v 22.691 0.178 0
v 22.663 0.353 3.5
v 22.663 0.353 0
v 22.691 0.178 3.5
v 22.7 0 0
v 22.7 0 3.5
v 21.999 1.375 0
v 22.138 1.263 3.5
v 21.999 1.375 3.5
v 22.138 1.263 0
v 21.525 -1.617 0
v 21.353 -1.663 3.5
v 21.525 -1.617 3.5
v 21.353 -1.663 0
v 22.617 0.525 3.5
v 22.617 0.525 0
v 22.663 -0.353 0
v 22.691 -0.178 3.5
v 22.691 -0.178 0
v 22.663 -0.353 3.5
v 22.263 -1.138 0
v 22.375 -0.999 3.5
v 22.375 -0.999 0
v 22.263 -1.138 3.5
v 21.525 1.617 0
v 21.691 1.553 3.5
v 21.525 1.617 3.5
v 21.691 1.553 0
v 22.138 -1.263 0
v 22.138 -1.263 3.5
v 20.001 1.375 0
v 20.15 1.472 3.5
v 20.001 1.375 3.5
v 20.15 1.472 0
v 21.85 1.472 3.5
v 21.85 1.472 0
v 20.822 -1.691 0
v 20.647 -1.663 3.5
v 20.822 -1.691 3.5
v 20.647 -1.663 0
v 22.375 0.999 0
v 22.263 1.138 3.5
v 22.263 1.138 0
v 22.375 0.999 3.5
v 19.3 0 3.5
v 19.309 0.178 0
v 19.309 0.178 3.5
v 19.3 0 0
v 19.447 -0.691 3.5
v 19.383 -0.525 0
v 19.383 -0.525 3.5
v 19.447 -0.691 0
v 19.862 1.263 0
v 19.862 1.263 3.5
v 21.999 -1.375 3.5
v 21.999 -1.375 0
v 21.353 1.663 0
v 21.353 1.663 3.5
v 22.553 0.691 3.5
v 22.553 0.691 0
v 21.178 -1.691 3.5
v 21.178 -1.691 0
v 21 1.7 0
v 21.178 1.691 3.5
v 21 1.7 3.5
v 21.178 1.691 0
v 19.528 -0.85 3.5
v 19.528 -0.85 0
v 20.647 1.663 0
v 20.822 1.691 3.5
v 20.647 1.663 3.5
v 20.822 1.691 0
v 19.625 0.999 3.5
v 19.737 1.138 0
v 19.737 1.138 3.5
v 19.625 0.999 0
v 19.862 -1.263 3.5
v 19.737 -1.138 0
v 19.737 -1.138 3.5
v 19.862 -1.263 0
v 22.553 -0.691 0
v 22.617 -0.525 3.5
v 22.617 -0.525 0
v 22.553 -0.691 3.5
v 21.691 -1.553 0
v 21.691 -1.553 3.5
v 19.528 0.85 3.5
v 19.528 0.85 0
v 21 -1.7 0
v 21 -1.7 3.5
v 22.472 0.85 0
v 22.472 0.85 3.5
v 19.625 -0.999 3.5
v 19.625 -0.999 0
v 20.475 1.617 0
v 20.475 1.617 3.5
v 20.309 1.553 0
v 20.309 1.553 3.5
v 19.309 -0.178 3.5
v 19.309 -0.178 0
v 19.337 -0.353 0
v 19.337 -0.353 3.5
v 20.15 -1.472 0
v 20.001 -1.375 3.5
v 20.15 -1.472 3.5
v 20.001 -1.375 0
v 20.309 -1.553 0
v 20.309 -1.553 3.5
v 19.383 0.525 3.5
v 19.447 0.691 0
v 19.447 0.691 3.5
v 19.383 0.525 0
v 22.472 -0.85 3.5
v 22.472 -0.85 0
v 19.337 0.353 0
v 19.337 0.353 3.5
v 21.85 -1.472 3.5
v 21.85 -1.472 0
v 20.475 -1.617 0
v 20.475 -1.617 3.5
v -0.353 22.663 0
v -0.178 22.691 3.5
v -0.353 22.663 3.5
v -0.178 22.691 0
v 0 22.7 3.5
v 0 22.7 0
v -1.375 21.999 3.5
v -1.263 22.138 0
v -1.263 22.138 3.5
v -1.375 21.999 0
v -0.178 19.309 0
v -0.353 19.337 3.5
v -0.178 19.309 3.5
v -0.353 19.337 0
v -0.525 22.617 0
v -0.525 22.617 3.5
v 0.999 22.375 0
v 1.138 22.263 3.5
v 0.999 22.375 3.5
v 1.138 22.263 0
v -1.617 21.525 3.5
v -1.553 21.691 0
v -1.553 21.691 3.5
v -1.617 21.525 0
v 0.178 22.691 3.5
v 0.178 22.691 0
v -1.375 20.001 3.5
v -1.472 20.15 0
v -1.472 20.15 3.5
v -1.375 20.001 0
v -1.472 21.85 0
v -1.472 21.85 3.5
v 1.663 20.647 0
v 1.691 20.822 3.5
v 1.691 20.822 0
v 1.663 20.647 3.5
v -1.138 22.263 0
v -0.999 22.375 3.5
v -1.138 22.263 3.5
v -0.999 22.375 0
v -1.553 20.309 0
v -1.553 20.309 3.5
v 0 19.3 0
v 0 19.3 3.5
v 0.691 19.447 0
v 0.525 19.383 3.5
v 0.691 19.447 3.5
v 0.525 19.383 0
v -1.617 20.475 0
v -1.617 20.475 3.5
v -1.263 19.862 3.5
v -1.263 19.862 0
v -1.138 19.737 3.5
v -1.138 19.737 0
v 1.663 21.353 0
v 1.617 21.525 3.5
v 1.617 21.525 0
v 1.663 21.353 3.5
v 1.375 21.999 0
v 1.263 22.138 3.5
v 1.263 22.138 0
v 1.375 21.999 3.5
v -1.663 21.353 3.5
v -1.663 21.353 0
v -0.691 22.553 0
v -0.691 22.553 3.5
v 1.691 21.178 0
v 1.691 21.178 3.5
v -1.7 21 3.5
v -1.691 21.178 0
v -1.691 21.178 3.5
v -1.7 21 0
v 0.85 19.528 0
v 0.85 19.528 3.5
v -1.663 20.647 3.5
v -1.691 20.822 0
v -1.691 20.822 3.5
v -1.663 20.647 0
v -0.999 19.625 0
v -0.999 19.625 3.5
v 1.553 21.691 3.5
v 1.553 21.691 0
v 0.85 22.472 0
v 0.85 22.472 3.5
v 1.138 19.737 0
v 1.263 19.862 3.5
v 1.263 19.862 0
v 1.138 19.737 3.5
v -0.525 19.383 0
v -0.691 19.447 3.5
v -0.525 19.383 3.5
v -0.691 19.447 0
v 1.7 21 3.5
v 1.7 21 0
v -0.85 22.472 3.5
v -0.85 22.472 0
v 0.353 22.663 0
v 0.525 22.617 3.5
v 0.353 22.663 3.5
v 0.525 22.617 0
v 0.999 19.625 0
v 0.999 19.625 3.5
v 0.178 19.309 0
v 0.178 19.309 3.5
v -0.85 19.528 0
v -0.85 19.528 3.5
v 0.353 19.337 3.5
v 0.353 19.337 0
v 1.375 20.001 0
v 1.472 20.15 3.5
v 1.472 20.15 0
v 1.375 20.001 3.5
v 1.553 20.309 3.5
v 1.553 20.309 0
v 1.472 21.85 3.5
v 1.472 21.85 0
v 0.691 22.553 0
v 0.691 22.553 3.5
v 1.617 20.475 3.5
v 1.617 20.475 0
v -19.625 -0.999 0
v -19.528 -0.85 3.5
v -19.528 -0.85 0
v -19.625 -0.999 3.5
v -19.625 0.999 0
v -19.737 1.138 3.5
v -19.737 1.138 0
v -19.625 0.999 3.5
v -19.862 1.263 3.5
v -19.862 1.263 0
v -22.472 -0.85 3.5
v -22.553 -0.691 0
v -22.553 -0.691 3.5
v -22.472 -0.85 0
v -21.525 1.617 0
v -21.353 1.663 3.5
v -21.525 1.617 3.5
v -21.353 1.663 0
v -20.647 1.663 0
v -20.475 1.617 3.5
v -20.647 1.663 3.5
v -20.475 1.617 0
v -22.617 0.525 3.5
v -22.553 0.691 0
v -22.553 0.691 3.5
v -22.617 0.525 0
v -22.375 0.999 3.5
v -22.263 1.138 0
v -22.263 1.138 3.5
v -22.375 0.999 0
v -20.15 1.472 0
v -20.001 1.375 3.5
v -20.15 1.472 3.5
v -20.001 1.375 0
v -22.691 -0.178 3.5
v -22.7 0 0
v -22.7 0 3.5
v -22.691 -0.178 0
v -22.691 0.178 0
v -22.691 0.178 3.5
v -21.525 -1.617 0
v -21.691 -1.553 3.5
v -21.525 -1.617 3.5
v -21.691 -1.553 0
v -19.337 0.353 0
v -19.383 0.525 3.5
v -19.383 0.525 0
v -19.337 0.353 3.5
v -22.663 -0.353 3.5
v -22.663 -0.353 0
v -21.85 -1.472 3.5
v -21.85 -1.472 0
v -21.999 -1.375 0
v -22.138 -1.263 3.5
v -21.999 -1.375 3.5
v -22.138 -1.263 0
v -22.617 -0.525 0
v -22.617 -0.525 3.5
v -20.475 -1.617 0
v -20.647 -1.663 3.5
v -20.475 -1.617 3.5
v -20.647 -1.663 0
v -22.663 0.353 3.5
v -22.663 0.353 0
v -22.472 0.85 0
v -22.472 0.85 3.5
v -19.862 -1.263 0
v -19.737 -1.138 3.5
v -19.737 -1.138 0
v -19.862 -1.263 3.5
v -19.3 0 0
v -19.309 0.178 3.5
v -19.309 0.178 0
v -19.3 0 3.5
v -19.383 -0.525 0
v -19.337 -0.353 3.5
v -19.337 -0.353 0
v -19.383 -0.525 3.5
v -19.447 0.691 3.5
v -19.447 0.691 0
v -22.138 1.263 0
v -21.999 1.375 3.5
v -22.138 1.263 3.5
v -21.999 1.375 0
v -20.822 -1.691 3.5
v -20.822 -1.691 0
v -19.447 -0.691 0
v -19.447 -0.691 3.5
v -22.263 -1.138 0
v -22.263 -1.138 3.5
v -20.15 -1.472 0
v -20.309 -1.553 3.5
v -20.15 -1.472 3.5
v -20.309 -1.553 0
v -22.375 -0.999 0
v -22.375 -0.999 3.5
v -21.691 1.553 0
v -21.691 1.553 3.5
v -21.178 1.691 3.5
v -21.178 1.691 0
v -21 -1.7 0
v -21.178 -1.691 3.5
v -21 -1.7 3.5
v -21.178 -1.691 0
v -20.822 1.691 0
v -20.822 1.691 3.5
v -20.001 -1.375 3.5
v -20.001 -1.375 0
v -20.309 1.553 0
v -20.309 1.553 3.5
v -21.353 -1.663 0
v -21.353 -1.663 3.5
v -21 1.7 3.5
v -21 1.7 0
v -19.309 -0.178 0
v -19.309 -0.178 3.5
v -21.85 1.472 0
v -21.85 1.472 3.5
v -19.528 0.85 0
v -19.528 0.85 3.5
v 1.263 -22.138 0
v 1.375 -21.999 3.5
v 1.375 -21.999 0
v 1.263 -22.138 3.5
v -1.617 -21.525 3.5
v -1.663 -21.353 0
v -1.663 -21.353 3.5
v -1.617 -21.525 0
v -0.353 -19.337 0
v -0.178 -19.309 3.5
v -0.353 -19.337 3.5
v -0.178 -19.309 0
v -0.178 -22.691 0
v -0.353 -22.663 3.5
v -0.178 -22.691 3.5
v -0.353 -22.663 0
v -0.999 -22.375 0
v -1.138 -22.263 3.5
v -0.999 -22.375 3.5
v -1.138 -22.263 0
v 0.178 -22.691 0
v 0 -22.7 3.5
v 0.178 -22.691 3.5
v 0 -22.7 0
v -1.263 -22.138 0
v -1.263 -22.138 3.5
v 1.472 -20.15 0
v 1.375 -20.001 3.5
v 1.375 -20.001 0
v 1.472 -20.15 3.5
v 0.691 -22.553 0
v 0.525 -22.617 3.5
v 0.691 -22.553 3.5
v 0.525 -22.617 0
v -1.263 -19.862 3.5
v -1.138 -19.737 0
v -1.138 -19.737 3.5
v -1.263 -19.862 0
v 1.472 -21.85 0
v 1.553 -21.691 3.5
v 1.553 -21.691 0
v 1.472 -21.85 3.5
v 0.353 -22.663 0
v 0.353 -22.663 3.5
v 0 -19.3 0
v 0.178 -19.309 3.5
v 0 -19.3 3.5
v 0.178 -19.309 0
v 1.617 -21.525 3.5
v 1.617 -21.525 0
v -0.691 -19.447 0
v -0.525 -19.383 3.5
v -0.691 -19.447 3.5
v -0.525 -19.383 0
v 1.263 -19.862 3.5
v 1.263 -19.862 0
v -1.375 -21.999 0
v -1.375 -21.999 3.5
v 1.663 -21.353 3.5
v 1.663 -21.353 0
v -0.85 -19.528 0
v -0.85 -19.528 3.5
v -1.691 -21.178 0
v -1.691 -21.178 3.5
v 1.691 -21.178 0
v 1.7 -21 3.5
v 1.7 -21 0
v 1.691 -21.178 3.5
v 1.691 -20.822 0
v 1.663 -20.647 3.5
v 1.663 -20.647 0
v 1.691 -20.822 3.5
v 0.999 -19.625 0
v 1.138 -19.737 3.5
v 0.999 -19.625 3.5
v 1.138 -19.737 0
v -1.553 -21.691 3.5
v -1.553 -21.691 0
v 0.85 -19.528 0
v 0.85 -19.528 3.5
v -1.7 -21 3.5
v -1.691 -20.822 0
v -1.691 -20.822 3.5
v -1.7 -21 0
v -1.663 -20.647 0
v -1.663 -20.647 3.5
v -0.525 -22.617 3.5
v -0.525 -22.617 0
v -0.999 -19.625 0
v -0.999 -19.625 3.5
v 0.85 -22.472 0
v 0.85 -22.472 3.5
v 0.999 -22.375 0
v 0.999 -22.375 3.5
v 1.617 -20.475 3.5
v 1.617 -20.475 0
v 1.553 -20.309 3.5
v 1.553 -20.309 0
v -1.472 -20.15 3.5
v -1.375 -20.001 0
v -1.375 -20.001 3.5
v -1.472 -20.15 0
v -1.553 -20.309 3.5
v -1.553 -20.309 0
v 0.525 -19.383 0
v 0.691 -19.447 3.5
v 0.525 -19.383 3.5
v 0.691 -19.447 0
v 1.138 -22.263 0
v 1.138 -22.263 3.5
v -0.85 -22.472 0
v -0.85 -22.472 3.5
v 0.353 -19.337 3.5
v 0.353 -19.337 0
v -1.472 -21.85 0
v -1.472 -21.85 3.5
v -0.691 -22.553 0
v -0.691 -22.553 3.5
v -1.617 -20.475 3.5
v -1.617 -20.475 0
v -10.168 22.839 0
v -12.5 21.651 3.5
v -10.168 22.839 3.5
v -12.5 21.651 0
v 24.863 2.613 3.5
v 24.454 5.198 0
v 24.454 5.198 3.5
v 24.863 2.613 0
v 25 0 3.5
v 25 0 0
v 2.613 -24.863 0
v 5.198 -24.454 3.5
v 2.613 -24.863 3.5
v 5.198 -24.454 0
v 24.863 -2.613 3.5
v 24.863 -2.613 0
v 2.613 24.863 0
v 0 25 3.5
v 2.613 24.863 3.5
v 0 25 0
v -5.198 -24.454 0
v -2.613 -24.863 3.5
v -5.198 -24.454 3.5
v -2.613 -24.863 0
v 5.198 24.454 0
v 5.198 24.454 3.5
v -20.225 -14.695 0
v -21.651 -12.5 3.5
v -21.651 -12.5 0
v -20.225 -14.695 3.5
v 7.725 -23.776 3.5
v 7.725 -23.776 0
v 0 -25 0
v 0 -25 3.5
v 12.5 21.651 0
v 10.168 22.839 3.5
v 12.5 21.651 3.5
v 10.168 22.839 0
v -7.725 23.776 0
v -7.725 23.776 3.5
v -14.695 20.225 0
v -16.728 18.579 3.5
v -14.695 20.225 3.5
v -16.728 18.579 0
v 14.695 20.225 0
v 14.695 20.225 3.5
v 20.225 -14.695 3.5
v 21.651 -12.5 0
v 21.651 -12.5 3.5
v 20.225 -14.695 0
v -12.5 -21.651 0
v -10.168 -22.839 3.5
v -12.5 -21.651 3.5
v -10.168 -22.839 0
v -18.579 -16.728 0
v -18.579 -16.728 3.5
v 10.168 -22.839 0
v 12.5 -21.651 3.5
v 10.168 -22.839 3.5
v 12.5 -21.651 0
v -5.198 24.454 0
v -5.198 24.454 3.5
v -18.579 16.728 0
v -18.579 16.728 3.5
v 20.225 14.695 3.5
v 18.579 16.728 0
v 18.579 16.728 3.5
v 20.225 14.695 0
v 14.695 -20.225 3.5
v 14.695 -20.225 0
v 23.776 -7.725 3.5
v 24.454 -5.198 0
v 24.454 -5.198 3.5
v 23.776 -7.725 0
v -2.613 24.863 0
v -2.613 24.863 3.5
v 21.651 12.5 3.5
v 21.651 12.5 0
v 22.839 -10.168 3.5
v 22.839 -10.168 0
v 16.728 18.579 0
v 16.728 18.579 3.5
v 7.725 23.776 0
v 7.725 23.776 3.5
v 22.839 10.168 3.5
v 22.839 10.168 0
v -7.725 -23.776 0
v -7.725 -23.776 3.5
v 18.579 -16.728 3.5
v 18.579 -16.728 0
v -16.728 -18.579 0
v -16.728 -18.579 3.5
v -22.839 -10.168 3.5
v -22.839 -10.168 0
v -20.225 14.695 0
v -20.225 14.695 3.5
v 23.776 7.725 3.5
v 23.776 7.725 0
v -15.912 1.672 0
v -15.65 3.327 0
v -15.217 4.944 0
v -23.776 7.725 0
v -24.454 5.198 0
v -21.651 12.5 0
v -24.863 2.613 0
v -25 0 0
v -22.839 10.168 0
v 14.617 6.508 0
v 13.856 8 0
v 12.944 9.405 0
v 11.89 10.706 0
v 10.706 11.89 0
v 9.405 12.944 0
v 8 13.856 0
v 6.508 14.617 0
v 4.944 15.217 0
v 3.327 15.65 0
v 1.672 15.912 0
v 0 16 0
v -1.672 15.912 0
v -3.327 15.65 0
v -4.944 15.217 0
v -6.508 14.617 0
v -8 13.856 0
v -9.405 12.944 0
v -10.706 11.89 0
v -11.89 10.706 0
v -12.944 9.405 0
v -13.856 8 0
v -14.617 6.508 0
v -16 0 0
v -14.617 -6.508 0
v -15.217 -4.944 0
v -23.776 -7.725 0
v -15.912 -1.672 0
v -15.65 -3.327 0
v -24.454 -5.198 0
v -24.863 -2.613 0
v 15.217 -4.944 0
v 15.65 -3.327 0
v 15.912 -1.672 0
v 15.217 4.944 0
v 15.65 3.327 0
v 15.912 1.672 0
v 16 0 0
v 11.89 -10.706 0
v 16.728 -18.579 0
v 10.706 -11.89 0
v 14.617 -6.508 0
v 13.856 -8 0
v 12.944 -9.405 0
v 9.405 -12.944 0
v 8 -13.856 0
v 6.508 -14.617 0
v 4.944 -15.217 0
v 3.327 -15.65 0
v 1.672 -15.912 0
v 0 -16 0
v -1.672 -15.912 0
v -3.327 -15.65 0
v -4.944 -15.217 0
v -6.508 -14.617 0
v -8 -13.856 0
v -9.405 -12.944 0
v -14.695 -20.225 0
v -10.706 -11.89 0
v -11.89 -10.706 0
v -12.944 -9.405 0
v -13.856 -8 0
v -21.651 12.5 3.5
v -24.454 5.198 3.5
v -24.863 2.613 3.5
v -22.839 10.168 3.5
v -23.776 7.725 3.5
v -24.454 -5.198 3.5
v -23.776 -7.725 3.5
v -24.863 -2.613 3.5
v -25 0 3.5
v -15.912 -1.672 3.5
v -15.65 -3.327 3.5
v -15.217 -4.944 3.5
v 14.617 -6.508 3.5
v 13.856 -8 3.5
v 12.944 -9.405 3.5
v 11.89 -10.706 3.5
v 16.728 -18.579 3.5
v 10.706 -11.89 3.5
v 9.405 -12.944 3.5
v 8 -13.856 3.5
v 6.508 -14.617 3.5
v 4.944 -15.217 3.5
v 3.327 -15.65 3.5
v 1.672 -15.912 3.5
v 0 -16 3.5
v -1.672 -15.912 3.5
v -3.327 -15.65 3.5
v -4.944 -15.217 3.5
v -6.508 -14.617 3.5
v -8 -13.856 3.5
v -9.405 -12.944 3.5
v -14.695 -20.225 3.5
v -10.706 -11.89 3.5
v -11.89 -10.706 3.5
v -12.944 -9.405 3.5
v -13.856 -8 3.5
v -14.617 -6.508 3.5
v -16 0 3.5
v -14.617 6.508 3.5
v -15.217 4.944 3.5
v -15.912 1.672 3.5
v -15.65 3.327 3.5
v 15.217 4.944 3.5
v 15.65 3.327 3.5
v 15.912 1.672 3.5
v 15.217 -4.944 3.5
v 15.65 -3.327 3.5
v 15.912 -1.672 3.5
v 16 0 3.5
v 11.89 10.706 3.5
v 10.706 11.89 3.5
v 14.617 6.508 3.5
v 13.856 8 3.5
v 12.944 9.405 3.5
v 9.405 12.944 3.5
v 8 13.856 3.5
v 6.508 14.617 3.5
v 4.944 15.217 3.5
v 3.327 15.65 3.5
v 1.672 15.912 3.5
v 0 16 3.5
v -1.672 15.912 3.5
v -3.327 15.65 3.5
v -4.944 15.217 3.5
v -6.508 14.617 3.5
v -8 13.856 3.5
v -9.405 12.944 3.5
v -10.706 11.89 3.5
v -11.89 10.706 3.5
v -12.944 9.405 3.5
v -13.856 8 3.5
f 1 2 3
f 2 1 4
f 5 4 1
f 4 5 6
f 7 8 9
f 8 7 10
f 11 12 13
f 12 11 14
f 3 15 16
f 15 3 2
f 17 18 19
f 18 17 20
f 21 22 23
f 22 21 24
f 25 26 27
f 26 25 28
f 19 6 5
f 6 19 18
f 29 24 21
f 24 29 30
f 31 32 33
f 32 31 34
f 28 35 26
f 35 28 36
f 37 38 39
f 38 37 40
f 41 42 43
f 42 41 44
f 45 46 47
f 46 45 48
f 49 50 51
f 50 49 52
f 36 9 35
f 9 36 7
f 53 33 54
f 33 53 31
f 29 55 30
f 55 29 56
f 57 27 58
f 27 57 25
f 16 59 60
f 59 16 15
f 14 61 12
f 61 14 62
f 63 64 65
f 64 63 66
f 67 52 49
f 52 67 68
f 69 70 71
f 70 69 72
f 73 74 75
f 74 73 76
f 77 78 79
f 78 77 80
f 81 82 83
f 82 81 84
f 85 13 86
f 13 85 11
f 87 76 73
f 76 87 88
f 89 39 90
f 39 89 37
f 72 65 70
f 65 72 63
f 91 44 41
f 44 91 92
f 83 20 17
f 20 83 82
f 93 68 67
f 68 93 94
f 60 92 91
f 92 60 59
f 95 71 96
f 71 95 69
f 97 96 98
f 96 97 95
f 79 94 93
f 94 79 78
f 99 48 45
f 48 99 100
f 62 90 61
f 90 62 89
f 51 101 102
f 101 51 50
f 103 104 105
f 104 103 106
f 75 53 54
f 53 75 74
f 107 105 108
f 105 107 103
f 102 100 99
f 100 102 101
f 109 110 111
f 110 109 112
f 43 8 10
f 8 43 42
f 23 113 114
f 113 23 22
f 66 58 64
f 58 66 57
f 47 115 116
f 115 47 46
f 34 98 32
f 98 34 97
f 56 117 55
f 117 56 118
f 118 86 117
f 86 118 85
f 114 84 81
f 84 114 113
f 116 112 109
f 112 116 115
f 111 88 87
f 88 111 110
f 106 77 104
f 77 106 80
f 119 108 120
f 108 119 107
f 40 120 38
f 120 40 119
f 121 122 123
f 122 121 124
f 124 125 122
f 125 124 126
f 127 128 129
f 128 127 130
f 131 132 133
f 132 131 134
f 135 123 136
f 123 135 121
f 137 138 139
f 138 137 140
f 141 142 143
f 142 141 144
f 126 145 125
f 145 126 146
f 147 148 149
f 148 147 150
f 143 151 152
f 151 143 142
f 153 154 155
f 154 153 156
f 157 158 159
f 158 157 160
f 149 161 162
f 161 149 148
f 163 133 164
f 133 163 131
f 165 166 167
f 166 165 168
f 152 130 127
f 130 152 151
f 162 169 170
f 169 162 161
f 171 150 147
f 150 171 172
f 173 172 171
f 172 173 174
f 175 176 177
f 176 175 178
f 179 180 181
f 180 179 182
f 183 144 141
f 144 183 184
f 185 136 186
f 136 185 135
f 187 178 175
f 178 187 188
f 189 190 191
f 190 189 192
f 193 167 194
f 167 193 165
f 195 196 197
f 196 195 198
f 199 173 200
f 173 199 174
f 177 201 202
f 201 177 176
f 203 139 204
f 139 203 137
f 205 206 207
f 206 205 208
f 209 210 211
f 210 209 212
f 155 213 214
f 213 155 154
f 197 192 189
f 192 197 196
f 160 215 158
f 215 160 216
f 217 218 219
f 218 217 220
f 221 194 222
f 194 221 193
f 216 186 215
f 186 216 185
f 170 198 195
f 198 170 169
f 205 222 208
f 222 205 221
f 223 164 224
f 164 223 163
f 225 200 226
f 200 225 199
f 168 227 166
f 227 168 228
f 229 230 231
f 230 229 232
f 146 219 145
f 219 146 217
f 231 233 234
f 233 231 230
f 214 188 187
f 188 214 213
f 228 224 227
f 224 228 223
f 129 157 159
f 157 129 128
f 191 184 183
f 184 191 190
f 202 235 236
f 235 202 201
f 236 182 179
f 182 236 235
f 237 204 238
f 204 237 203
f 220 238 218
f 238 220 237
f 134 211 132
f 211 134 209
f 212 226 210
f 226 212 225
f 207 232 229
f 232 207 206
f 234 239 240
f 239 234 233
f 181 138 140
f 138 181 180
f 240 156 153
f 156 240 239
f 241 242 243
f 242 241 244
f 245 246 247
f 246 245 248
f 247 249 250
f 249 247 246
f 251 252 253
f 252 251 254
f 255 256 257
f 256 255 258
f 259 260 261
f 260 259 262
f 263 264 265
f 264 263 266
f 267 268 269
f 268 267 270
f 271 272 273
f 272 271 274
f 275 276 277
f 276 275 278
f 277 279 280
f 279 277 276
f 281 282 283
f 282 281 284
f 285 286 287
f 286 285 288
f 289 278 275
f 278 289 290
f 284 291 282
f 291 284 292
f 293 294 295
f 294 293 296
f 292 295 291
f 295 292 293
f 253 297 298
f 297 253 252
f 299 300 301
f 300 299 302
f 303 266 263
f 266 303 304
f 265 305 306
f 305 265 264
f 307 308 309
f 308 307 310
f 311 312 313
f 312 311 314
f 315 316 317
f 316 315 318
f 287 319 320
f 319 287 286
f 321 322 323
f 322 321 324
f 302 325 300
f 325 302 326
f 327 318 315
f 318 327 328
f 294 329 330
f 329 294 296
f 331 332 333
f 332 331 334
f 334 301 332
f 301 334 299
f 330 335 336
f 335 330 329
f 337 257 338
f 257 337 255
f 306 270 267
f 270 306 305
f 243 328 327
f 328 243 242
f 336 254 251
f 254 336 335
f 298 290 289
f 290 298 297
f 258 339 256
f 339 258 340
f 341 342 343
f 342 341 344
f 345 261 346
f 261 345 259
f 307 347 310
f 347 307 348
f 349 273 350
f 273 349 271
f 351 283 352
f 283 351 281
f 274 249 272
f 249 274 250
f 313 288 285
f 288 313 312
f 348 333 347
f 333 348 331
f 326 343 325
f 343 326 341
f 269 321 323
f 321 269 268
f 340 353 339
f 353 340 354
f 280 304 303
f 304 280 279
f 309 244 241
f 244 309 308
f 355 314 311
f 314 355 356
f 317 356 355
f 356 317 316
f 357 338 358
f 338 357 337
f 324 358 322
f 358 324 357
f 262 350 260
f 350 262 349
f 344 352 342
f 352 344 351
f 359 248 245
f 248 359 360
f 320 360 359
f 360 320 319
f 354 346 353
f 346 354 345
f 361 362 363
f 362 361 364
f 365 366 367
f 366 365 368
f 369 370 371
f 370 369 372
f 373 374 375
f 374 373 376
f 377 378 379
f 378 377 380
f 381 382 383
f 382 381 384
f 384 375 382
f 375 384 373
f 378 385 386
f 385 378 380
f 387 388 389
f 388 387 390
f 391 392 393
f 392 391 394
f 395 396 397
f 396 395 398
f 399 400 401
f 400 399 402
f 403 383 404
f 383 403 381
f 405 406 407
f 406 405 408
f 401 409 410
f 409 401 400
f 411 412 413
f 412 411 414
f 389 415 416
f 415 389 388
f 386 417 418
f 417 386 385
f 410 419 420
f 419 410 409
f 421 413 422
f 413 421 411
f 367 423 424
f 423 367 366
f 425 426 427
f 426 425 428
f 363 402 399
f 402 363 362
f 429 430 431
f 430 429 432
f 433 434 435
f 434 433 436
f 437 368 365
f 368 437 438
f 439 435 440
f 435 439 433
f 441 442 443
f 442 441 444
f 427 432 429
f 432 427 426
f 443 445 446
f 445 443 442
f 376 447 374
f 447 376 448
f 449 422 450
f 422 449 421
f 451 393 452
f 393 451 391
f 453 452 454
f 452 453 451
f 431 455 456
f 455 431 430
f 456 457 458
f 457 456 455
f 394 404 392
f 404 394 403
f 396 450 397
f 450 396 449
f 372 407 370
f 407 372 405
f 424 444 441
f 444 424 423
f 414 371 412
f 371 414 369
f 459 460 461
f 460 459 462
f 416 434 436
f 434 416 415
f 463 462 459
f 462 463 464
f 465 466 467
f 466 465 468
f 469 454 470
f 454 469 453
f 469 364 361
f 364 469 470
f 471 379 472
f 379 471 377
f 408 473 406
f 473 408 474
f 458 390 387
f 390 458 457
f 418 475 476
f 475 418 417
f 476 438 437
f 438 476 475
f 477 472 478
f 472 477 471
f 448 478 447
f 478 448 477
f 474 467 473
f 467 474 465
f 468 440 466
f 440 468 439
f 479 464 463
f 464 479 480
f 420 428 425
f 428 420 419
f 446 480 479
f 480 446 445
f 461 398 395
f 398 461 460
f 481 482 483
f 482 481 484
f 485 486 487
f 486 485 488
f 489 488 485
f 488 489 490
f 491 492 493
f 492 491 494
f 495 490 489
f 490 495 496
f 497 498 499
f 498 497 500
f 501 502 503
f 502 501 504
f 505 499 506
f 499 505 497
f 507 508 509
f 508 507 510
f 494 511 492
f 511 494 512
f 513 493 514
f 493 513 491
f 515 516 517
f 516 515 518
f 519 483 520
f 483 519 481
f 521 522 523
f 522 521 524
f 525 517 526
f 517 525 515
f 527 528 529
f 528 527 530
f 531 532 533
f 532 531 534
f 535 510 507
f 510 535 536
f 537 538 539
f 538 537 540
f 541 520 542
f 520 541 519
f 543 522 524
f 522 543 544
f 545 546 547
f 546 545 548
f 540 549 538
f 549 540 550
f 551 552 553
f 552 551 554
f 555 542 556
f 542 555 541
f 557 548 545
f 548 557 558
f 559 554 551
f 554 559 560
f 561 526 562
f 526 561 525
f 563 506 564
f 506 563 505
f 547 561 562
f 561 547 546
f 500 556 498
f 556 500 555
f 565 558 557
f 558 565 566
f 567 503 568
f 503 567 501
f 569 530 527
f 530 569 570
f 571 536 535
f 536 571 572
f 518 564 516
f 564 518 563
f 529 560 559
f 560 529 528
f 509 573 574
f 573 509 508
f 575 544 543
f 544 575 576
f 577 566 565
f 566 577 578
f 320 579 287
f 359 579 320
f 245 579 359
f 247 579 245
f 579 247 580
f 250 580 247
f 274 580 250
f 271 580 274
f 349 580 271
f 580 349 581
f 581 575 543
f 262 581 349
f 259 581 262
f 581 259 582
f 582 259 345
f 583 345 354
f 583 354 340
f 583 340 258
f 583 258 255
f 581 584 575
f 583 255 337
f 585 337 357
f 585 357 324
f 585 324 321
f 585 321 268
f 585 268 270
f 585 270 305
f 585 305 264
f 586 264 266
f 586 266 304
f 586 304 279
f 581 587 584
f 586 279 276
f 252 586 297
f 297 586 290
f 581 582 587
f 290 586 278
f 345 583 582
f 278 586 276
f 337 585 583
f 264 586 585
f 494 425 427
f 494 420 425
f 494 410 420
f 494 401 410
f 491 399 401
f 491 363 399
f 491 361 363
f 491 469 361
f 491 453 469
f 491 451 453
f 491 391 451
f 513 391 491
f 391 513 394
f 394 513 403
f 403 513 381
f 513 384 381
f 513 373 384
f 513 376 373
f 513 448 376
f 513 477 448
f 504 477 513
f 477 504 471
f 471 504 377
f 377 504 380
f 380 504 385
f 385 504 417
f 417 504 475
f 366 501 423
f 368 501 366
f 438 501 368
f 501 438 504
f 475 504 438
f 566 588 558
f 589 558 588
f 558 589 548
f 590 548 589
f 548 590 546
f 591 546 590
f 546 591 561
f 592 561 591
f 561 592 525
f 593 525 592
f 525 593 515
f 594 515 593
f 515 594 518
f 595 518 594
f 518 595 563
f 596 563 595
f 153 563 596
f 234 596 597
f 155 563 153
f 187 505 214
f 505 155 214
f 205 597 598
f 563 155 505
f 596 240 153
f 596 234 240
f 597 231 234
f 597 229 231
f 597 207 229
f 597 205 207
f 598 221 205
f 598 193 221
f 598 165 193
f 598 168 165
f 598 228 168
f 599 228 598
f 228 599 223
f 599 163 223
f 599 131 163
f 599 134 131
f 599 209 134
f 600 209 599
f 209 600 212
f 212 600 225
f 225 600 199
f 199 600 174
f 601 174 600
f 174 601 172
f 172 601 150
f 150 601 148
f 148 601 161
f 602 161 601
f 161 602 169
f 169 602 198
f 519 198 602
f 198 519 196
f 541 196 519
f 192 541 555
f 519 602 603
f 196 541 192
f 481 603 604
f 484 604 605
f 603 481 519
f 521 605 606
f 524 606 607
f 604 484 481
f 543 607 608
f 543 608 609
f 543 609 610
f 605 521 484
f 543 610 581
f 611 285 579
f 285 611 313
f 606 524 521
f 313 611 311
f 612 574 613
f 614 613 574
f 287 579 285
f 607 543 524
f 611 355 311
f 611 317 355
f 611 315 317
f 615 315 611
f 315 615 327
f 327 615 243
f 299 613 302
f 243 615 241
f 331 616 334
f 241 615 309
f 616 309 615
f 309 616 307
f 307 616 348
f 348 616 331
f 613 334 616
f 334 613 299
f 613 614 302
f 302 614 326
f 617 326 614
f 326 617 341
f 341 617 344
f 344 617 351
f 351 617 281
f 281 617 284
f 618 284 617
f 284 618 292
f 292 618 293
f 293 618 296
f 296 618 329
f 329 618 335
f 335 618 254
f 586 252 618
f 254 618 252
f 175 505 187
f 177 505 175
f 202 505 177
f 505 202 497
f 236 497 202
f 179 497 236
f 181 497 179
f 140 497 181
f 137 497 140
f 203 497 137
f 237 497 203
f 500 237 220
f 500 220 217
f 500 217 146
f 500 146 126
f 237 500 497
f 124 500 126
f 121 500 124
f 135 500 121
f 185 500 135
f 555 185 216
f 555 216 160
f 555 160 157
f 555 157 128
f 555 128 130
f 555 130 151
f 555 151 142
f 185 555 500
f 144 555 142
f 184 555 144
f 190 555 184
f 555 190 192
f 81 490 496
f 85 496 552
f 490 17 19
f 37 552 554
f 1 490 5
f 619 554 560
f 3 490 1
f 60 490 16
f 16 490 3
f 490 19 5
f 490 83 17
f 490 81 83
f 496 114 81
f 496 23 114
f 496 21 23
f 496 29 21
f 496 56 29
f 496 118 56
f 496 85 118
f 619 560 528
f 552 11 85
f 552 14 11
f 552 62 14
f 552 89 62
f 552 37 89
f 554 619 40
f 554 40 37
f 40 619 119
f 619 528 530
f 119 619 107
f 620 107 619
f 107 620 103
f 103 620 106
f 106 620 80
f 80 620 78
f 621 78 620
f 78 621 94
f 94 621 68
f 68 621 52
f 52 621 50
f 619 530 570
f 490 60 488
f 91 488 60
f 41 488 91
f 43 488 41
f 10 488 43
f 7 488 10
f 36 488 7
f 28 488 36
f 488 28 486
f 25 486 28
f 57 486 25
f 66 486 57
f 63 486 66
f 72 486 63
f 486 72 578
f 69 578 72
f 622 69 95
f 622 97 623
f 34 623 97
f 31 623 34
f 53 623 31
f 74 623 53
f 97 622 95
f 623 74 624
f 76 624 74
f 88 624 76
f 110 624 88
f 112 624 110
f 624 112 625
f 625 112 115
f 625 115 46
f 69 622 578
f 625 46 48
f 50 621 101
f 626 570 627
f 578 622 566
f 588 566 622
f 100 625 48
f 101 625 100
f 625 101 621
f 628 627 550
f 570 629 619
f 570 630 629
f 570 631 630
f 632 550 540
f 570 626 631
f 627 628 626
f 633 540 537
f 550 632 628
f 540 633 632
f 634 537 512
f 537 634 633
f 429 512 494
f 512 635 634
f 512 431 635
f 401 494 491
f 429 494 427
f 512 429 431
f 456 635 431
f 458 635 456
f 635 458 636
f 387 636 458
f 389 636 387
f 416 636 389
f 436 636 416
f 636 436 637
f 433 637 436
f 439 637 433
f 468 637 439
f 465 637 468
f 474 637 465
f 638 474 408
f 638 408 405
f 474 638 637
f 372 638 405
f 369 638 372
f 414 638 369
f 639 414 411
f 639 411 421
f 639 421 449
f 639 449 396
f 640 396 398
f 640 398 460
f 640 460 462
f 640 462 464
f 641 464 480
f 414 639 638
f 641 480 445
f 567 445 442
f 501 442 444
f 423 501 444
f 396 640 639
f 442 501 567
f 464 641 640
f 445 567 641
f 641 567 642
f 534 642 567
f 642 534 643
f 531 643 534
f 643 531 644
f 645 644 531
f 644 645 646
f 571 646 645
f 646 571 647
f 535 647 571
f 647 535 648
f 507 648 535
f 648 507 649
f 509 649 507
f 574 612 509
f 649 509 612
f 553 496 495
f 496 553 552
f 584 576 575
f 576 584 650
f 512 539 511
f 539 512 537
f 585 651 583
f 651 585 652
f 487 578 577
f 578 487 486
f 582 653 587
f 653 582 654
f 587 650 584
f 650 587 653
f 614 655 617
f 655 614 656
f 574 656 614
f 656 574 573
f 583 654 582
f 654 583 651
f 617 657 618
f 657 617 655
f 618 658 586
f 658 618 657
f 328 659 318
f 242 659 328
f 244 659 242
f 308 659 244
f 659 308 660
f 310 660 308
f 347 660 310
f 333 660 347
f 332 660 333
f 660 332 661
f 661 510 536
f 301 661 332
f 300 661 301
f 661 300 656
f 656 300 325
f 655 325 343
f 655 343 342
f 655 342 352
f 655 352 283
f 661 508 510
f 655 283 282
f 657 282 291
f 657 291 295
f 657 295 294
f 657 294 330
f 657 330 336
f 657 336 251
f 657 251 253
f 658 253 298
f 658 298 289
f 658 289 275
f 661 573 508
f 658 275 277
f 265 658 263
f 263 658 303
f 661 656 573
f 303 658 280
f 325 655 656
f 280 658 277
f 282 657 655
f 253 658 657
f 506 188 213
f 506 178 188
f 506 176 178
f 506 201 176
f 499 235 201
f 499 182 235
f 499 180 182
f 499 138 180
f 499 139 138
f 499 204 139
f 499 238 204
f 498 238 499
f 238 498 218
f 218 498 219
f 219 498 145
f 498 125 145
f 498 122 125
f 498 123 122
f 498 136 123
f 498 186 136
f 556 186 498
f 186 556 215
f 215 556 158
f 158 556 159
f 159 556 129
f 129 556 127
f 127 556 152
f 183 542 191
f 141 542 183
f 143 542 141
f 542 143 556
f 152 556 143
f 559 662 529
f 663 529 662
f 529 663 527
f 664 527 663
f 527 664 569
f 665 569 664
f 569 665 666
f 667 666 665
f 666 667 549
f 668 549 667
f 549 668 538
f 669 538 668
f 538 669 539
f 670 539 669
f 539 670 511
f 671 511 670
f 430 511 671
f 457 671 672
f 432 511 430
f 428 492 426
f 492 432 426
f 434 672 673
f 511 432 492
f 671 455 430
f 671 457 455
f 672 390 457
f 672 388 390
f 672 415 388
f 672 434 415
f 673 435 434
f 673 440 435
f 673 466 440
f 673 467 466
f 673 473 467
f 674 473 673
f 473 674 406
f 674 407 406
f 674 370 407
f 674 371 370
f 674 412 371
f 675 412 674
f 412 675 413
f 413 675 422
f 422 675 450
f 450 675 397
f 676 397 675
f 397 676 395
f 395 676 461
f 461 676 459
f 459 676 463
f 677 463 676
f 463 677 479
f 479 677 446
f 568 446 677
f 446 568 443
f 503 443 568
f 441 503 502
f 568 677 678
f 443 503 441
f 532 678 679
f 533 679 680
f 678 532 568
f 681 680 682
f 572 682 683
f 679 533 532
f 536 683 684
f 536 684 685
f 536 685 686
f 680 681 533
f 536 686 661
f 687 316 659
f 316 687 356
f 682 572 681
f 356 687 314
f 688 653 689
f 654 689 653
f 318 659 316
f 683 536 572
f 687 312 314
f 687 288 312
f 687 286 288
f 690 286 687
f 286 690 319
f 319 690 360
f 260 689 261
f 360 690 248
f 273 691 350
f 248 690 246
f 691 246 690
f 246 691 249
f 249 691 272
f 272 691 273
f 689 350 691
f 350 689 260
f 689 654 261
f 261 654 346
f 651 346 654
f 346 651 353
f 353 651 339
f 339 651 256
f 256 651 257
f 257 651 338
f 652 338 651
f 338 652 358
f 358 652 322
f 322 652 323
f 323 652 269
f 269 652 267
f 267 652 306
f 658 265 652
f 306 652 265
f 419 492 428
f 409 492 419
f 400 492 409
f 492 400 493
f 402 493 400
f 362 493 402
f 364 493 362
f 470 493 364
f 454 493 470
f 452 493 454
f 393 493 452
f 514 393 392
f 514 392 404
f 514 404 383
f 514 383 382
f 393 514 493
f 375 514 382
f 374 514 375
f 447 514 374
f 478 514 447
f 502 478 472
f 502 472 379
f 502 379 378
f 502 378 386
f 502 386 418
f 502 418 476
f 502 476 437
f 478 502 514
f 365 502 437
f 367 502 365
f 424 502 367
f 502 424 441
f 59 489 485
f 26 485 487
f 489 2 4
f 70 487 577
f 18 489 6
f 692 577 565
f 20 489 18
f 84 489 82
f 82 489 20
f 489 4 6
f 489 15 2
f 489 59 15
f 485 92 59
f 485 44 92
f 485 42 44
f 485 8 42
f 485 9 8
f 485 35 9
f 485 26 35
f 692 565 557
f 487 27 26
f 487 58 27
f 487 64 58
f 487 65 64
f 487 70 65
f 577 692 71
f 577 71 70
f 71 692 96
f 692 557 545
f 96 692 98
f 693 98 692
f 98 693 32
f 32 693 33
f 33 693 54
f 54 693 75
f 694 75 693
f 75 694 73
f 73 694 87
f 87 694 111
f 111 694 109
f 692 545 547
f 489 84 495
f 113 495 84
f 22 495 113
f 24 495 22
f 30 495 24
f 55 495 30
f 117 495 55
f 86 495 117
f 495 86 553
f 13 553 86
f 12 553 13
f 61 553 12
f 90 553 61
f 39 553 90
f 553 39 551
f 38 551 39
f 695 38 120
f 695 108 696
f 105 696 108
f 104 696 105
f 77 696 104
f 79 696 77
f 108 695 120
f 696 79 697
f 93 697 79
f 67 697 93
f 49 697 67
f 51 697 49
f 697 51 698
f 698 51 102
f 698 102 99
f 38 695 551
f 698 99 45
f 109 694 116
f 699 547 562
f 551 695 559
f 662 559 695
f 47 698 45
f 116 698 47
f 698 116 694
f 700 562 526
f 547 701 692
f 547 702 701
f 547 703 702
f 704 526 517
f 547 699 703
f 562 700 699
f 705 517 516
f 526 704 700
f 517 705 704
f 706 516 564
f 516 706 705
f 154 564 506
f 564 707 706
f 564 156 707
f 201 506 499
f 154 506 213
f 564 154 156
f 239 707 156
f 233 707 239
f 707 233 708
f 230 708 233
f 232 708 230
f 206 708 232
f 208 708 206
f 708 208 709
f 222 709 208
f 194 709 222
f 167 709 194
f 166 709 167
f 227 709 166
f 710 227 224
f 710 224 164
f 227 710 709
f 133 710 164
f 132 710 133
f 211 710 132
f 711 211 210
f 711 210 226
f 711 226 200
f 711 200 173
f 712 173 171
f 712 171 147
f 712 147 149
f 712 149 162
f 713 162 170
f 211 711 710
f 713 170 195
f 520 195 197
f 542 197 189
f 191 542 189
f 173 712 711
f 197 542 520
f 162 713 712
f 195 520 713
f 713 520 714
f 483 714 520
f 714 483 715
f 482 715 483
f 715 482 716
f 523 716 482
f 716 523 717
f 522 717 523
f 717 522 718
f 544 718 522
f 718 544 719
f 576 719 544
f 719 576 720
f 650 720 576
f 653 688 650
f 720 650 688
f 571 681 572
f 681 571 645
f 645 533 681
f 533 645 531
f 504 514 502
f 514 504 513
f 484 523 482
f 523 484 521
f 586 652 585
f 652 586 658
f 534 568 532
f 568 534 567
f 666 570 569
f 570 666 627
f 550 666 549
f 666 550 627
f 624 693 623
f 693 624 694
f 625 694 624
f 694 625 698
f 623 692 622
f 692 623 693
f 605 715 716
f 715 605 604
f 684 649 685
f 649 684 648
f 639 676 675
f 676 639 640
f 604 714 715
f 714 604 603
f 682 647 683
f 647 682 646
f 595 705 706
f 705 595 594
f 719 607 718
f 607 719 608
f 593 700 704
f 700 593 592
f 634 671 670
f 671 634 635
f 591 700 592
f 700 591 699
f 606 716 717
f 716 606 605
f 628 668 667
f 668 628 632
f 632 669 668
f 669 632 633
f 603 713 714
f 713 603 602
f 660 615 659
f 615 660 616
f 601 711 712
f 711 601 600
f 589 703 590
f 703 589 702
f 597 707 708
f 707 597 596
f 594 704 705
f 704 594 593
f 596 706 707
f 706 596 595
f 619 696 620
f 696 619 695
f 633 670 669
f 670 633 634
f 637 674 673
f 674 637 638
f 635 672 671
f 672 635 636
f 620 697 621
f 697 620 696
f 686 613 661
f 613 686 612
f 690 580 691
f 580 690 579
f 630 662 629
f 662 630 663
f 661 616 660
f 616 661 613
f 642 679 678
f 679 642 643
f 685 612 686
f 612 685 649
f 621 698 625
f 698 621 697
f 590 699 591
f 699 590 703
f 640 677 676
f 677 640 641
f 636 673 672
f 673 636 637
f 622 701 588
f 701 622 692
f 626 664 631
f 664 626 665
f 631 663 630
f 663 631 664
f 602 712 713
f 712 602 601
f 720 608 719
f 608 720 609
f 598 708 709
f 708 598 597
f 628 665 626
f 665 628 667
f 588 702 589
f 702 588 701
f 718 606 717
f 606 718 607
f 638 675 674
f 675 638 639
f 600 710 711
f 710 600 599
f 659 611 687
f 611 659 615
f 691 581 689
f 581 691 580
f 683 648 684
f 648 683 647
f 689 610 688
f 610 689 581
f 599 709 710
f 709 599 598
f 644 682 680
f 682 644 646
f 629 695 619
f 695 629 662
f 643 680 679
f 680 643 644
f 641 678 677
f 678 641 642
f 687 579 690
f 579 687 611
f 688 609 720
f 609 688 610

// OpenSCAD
// Bearing retaining ring.
$fn = 60;
eps = 0.02;
bearing_d = 32;
outer_d = 50;
thickness = 3.5;
difference() {
    cylinder(d=outer_d,h=thickness);
    translate([0,0,-eps]) cylinder(d=bearing_d,h=thickness+2*eps);
    for (i=[0:3]) rotate([0,0,i*90]) translate([outer_d/2-4,0,-eps]) cylinder(d=3.4,h=thickness+2*eps);
}
